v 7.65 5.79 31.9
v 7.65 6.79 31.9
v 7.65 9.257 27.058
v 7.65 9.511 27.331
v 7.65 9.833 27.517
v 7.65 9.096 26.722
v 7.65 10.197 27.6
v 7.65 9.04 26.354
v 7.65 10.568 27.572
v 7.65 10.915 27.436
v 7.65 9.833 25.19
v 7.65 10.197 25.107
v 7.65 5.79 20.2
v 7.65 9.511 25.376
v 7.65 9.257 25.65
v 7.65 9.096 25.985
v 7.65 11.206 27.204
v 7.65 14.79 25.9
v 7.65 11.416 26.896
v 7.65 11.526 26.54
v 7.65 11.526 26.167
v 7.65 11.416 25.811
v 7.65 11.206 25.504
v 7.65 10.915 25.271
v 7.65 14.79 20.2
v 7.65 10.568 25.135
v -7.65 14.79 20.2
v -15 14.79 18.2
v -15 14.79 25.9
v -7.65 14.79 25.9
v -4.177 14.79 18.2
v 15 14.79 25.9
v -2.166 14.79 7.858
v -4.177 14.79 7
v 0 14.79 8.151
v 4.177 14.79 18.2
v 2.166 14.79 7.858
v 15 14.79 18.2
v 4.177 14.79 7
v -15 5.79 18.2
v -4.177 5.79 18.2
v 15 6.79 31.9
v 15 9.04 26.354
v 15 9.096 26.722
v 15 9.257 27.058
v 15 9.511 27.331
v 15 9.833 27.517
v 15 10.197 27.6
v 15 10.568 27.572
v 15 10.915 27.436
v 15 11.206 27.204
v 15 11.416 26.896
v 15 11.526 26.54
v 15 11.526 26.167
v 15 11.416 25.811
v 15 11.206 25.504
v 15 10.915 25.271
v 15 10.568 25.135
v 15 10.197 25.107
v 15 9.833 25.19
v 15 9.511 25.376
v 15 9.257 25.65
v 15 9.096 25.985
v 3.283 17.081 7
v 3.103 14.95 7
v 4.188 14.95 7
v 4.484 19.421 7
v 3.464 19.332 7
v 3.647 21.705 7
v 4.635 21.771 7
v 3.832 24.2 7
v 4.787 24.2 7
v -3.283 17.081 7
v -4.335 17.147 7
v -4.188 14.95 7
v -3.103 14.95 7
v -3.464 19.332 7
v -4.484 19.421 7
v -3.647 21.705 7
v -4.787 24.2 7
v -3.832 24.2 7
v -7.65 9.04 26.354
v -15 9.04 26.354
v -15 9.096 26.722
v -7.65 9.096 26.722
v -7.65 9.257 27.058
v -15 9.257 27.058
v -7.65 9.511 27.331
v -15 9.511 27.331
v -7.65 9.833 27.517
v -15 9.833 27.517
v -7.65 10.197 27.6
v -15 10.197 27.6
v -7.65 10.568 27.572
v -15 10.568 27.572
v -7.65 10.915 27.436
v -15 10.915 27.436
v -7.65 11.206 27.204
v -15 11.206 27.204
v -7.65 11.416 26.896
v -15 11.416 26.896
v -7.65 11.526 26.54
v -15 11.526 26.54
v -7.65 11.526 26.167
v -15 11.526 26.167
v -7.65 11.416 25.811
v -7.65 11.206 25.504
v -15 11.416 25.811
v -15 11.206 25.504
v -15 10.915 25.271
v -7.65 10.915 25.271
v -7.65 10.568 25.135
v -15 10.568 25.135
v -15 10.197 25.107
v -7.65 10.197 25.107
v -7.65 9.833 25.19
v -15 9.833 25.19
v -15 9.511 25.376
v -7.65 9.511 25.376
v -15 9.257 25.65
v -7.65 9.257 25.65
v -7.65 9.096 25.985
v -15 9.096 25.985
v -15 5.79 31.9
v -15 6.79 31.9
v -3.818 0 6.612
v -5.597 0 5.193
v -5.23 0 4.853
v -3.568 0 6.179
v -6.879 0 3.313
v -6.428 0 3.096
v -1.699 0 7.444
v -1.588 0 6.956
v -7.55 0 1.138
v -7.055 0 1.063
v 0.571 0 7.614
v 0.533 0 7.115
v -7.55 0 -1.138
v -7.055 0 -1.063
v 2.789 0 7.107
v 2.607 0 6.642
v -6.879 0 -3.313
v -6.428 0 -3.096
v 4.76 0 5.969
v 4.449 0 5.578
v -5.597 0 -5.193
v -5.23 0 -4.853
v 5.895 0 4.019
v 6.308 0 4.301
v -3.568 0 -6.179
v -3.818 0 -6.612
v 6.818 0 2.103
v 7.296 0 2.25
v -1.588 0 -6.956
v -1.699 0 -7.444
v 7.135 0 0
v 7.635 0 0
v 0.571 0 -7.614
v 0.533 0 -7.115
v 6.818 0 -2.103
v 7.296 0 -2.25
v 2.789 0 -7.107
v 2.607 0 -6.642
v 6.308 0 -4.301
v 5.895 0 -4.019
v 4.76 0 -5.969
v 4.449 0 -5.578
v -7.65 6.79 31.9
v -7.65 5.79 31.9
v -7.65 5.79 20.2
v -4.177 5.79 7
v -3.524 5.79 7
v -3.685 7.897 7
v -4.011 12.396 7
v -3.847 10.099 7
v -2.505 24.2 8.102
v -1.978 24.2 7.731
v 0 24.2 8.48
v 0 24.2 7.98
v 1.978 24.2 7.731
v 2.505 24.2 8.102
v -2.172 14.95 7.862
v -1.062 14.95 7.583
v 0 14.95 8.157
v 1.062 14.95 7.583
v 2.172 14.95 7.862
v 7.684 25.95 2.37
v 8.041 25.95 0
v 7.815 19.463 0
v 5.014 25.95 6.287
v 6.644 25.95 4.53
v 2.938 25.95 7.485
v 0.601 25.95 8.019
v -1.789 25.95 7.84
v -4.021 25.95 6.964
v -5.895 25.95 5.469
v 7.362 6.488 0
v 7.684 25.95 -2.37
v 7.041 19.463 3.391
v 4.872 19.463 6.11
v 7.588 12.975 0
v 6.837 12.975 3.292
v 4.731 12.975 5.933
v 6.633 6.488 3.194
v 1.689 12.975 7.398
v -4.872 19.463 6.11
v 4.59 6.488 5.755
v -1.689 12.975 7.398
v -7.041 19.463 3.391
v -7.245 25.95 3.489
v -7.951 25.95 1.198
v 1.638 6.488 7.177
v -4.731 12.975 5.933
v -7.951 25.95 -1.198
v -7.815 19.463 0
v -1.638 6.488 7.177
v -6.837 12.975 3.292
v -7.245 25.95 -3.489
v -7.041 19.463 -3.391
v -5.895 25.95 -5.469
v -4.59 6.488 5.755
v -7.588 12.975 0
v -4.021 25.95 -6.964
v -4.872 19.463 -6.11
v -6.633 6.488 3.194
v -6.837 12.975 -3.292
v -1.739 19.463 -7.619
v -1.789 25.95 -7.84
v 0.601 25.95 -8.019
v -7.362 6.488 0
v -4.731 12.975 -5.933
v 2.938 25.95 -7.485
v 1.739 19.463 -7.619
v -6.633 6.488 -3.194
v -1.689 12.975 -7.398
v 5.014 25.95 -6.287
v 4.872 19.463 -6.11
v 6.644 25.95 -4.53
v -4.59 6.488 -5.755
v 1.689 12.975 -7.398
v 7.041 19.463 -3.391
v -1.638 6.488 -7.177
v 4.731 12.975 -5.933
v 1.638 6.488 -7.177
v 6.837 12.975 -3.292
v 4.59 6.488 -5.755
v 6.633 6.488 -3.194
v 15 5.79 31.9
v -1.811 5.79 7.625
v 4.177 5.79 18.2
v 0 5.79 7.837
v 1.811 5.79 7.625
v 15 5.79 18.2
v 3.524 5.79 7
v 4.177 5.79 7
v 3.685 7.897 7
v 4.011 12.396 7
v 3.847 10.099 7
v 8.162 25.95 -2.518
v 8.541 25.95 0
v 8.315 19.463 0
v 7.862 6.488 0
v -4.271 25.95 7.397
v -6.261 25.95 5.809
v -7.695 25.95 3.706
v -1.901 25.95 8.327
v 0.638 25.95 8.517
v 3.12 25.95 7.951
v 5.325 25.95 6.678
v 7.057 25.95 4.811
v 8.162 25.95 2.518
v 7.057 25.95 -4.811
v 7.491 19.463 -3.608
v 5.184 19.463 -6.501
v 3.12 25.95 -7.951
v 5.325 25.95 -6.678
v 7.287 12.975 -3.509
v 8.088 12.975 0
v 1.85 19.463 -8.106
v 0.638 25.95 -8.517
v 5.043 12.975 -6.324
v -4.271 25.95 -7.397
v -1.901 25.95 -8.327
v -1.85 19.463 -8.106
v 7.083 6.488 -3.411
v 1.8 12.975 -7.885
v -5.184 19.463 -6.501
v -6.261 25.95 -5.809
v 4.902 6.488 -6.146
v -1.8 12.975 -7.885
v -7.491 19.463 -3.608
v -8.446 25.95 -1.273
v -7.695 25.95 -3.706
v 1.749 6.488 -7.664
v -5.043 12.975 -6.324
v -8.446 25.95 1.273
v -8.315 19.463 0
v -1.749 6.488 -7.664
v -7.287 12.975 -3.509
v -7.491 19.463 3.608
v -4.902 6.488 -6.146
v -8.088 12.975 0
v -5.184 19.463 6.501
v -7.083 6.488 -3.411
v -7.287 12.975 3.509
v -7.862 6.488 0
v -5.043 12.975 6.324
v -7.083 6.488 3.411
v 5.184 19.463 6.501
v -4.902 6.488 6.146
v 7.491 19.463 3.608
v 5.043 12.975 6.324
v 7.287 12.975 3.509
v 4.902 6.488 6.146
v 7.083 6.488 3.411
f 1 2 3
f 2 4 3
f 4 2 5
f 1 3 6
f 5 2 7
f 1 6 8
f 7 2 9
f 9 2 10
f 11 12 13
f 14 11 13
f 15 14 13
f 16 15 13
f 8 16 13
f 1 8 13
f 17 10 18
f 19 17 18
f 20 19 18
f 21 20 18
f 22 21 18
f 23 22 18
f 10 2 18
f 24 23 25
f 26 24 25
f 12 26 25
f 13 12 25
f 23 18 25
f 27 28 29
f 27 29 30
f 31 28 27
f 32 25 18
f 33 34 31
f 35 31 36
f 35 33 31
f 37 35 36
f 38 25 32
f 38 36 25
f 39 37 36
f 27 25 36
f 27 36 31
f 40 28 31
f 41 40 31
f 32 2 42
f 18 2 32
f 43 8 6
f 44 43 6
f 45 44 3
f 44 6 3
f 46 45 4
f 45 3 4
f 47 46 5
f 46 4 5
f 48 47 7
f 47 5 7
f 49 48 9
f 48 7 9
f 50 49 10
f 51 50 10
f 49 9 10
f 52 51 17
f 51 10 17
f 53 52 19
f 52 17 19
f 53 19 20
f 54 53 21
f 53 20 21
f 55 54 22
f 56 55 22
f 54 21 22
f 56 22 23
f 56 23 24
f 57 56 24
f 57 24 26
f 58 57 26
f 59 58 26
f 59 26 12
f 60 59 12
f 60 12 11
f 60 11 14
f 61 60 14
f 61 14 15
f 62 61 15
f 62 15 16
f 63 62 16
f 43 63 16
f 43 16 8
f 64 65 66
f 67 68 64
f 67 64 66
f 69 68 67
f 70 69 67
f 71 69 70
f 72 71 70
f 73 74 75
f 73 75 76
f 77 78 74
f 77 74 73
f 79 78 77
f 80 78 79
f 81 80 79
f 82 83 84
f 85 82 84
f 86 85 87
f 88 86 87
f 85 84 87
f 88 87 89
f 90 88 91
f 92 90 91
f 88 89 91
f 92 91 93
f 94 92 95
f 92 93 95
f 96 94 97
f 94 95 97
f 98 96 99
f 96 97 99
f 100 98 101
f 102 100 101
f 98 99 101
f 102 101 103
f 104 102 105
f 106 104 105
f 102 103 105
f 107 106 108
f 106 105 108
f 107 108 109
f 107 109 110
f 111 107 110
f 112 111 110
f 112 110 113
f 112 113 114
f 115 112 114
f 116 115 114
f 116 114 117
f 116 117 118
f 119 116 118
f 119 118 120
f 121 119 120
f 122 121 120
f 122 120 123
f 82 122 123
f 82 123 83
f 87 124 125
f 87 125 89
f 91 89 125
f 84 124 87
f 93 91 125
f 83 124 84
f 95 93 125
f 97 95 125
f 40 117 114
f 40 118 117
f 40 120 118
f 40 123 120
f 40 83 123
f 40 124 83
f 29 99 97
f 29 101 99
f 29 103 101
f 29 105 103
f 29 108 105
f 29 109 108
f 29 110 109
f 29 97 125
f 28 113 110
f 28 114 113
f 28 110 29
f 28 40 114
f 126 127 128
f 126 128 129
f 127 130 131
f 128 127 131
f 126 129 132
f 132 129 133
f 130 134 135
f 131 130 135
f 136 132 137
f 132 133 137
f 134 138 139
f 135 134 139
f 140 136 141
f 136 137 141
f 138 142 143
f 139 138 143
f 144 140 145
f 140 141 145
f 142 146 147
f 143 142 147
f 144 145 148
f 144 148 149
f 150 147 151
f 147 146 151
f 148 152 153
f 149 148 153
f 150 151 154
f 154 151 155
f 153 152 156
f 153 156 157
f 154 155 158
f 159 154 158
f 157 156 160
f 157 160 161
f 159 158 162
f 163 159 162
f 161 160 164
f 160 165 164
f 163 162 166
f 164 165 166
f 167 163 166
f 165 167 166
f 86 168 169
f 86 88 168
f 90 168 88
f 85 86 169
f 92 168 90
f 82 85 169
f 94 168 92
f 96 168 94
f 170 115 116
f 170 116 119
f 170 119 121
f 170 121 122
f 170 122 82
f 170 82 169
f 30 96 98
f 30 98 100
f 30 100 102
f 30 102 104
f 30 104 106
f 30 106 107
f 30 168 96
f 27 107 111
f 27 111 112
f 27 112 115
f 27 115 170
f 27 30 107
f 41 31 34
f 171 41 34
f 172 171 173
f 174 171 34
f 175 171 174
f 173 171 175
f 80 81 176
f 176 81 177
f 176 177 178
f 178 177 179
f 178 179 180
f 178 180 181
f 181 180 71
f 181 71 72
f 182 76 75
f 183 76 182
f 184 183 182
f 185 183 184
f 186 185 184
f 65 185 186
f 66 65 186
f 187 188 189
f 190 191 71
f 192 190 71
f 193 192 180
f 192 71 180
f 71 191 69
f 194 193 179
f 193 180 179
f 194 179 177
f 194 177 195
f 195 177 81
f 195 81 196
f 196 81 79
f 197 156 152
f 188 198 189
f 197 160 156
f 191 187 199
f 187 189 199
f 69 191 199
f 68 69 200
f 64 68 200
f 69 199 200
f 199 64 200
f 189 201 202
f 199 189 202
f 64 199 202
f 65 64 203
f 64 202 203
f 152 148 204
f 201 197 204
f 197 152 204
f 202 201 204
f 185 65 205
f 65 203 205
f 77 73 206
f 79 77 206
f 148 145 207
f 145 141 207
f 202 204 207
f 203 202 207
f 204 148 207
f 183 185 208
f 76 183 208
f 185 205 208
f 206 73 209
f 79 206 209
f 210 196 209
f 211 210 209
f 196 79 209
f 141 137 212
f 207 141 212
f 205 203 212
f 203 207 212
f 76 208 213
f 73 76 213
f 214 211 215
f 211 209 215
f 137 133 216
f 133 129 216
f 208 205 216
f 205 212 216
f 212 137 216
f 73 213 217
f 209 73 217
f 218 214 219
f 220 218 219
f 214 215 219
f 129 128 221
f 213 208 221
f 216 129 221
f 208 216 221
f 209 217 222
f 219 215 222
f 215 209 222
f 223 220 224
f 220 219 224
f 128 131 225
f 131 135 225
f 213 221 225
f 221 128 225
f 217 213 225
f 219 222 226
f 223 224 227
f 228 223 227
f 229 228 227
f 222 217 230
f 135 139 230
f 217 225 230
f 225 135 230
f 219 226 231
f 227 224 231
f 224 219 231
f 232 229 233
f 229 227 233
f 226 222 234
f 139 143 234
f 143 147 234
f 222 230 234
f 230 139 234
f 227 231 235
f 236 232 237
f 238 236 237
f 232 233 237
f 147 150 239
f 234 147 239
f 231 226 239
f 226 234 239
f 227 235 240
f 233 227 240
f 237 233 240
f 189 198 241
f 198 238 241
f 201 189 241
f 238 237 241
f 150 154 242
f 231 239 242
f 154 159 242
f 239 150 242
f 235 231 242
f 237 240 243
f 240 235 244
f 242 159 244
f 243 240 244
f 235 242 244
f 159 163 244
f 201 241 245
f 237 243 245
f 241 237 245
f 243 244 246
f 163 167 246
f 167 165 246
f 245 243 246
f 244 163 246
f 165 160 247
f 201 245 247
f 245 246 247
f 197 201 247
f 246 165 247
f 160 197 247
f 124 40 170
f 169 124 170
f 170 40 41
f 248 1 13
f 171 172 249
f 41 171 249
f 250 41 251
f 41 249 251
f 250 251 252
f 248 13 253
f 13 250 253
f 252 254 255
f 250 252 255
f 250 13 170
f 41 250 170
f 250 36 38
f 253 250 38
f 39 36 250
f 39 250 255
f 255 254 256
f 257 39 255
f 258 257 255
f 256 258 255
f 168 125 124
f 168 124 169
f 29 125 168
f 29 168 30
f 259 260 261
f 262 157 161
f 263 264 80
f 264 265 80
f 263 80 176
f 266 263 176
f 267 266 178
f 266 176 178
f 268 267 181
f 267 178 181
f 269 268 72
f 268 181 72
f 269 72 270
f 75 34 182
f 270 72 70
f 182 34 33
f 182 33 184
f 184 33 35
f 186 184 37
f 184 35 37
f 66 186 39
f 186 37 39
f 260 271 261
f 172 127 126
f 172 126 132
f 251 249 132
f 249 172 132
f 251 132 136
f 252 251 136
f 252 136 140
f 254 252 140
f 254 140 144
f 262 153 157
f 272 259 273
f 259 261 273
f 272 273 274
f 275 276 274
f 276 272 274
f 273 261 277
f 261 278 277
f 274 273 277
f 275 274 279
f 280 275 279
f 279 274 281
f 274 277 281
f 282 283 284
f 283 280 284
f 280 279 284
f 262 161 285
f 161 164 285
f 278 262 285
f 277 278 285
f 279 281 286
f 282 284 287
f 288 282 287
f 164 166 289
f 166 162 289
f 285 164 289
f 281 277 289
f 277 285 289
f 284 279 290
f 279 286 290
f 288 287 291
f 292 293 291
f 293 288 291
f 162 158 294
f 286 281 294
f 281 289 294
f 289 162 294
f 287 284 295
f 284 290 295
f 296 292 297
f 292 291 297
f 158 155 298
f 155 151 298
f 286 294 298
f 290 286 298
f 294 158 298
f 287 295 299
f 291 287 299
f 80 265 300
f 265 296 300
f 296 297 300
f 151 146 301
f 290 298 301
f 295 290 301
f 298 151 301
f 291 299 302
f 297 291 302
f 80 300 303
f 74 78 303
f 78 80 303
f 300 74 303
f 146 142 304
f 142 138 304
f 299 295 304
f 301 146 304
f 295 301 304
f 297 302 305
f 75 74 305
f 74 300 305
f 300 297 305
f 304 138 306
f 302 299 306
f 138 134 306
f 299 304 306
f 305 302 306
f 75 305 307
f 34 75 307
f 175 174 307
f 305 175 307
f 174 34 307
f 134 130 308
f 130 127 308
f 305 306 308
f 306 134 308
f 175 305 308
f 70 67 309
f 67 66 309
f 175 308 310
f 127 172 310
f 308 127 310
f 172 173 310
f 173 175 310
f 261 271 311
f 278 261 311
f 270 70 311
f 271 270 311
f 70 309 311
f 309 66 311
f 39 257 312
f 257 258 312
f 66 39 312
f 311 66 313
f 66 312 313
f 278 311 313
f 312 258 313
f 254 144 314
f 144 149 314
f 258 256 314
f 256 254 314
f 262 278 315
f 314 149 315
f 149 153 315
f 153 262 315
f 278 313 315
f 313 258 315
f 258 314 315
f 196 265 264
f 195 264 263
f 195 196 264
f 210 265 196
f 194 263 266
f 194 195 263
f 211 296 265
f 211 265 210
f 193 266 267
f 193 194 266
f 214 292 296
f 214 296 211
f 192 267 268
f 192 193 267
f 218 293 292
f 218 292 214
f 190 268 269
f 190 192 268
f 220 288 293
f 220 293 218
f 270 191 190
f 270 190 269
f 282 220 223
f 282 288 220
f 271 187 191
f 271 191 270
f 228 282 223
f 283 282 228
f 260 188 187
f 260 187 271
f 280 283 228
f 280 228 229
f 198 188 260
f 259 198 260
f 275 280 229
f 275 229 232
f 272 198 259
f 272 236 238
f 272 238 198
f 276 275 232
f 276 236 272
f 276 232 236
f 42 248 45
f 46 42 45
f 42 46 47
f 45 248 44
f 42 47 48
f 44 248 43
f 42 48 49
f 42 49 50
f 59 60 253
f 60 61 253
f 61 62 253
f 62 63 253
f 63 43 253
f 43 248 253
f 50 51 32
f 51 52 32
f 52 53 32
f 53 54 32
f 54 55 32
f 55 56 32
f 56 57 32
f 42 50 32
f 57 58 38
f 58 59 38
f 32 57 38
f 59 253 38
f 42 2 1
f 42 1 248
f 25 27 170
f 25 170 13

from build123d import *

# Parameters (mm, degrees)
SKETCH1_R           = 7.635
BOSS_EXTRUDE1_DEPTH = 26.95
BOSS_EXTRUDE1_DRAFT = -2
SKETCH5_W           = 30
SKETCH5_H           = 9
BOSS_EXTRUDE3_DEPTH = 24.9
SKETCH6_R           = 7.135
CUT_EXTRUDE1_DEPTH  = 37
CUT_EXTRUDE1_DRAFT  = 2
SKETCH7_W           = 15.3
SKETCH7_H           = 11.7
SKETCH7_W_2         = 10.82308768
SKETCH7_H_2         = 11.2
CUT_EXTRUDE2_DEPTH  = 38
CUT_EXTRUDE3_DEPTH  = 32
SKETCH9_R           = 1.25
CUT_EXTRUDE4_DEPTH  = 32
SKETCH10_W          = 17.5
SKETCH10_H          = 9.25
CUT_EXTRUDE5_DEPTH  = 15
SKETCH3_R           = 11.551989241
CUT_EXTRUDE6_DEPTH  = 1


with BuildPart() as part:
    # Sketch1 → Boss-Extrude1 (with draft: the straight prism first)
    with BuildSketch(Plane(origin=(0, 0, 0), x_dir=(1, 0, 0), z_dir=(0, 1, 0))):
        Circle(SKETCH1_R)
    extrude(amount=BOSS_EXTRUDE1_DEPTH)
    # Boss-Extrude1: the draft: its side faces are tilted about the plane it starts from
    boss_extrude1_sides = [part.faces().sort_by_distance(p)[0] for p in [
        (-7.635, 13.475, 0),
    ]]
    draft(boss_extrude1_sides, Plane(origin=(0, 0, 0), x_dir=(1, 0, 0), z_dir=(0, 1, 0)), BOSS_EXTRUDE1_DRAFT)

    # Sketch5 → Boss-Extrude3 (add)
    with BuildSketch(Plane.XY.offset(7)):
        with Locations((0, 10.29)):
            Rectangle(SKETCH5_W, SKETCH5_H)
    extrude(amount=BOSS_EXTRUDE3_DEPTH)


with BuildPart() as cut_extrude1_tool:
    # Sketch6 → Cut-Extrude1 (with draft: the straight prism first)
    with BuildSketch(Plane.XZ):
        Circle(SKETCH6_R)
    extrude(amount=-CUT_EXTRUDE1_DEPTH)
    # Cut-Extrude1: the draft: its side faces are tilted about the plane it starts from
    cut_extrude1_sides = [cut_extrude1_tool.faces().sort_by_distance(p)[0] for p in [
        (-7.135, 18.5, 0),
    ]]
    draft(cut_extrude1_sides, Plane.XZ, CUT_EXTRUDE1_DRAFT)


with BuildPart() as part_1:
    add(part.part)

    # Cut-Extrude1: cut by cut_extrude1_tool
    add(cut_extrude1_tool.part, mode=Mode.SUBTRACT)

    # Sketch7 → Cut-Extrude2 (cut)
    with BuildSketch(Plane(origin=(0, 14.79, 0), x_dir=(1, 0, 0), z_dir=(0, 1, 0))):
        with Locations((0, -26.05)):
            Rectangle(SKETCH7_W, SKETCH7_H)
        with Locations((9.58845616, -12.6)):
            Rectangle(SKETCH7_W_2, SKETCH7_H_2)
        with Locations((-9.58845616, -12.6)):
            Rectangle(SKETCH7_W_2, SKETCH7_H_2)
    extrude(amount=-CUT_EXTRUDE2_DEPTH, mode=Mode.SUBTRACT)

    # Sketch8 → Cut-Extrude3 (cut)
    with BuildSketch(Plane.ZY.offset(15)):
        Polygon((31.9, 6.79), (25.9, 14.79), (31.9, 14.79), align=None)
    extrude(amount=-CUT_EXTRUDE3_DEPTH, mode=Mode.SUBTRACT)

    # Sketch9 → Cut-Extrude4 (cut)
    with BuildSketch(Plane.ZY.offset(15)):
        with Locations(Location((26.353732334, 10.29, 0), (0, 0, 270))):
            Circle(SKETCH9_R)
    extrude(amount=-CUT_EXTRUDE4_DEPTH, mode=Mode.SUBTRACT)

    # Sketch10 → Cut-Extrude5 (cut)
    with BuildSketch(Plane.XY.offset(7)):
        with Locations((0, 19.575)):
            Rectangle(SKETCH10_W, SKETCH10_H)
    extrude(amount=CUT_EXTRUDE5_DEPTH, mode=Mode.SUBTRACT)

    # Sketch3 → Cut-Extrude6 (cut)
    with BuildSketch(Plane(origin=(0, 26.95, 0), x_dir=(1, 0, 0), z_dir=(0, 1, 0))):
        Circle(SKETCH3_R)
    extrude(amount=-CUT_EXTRUDE6_DEPTH, mode=Mode.SUBTRACT)


solid = part_1.part
